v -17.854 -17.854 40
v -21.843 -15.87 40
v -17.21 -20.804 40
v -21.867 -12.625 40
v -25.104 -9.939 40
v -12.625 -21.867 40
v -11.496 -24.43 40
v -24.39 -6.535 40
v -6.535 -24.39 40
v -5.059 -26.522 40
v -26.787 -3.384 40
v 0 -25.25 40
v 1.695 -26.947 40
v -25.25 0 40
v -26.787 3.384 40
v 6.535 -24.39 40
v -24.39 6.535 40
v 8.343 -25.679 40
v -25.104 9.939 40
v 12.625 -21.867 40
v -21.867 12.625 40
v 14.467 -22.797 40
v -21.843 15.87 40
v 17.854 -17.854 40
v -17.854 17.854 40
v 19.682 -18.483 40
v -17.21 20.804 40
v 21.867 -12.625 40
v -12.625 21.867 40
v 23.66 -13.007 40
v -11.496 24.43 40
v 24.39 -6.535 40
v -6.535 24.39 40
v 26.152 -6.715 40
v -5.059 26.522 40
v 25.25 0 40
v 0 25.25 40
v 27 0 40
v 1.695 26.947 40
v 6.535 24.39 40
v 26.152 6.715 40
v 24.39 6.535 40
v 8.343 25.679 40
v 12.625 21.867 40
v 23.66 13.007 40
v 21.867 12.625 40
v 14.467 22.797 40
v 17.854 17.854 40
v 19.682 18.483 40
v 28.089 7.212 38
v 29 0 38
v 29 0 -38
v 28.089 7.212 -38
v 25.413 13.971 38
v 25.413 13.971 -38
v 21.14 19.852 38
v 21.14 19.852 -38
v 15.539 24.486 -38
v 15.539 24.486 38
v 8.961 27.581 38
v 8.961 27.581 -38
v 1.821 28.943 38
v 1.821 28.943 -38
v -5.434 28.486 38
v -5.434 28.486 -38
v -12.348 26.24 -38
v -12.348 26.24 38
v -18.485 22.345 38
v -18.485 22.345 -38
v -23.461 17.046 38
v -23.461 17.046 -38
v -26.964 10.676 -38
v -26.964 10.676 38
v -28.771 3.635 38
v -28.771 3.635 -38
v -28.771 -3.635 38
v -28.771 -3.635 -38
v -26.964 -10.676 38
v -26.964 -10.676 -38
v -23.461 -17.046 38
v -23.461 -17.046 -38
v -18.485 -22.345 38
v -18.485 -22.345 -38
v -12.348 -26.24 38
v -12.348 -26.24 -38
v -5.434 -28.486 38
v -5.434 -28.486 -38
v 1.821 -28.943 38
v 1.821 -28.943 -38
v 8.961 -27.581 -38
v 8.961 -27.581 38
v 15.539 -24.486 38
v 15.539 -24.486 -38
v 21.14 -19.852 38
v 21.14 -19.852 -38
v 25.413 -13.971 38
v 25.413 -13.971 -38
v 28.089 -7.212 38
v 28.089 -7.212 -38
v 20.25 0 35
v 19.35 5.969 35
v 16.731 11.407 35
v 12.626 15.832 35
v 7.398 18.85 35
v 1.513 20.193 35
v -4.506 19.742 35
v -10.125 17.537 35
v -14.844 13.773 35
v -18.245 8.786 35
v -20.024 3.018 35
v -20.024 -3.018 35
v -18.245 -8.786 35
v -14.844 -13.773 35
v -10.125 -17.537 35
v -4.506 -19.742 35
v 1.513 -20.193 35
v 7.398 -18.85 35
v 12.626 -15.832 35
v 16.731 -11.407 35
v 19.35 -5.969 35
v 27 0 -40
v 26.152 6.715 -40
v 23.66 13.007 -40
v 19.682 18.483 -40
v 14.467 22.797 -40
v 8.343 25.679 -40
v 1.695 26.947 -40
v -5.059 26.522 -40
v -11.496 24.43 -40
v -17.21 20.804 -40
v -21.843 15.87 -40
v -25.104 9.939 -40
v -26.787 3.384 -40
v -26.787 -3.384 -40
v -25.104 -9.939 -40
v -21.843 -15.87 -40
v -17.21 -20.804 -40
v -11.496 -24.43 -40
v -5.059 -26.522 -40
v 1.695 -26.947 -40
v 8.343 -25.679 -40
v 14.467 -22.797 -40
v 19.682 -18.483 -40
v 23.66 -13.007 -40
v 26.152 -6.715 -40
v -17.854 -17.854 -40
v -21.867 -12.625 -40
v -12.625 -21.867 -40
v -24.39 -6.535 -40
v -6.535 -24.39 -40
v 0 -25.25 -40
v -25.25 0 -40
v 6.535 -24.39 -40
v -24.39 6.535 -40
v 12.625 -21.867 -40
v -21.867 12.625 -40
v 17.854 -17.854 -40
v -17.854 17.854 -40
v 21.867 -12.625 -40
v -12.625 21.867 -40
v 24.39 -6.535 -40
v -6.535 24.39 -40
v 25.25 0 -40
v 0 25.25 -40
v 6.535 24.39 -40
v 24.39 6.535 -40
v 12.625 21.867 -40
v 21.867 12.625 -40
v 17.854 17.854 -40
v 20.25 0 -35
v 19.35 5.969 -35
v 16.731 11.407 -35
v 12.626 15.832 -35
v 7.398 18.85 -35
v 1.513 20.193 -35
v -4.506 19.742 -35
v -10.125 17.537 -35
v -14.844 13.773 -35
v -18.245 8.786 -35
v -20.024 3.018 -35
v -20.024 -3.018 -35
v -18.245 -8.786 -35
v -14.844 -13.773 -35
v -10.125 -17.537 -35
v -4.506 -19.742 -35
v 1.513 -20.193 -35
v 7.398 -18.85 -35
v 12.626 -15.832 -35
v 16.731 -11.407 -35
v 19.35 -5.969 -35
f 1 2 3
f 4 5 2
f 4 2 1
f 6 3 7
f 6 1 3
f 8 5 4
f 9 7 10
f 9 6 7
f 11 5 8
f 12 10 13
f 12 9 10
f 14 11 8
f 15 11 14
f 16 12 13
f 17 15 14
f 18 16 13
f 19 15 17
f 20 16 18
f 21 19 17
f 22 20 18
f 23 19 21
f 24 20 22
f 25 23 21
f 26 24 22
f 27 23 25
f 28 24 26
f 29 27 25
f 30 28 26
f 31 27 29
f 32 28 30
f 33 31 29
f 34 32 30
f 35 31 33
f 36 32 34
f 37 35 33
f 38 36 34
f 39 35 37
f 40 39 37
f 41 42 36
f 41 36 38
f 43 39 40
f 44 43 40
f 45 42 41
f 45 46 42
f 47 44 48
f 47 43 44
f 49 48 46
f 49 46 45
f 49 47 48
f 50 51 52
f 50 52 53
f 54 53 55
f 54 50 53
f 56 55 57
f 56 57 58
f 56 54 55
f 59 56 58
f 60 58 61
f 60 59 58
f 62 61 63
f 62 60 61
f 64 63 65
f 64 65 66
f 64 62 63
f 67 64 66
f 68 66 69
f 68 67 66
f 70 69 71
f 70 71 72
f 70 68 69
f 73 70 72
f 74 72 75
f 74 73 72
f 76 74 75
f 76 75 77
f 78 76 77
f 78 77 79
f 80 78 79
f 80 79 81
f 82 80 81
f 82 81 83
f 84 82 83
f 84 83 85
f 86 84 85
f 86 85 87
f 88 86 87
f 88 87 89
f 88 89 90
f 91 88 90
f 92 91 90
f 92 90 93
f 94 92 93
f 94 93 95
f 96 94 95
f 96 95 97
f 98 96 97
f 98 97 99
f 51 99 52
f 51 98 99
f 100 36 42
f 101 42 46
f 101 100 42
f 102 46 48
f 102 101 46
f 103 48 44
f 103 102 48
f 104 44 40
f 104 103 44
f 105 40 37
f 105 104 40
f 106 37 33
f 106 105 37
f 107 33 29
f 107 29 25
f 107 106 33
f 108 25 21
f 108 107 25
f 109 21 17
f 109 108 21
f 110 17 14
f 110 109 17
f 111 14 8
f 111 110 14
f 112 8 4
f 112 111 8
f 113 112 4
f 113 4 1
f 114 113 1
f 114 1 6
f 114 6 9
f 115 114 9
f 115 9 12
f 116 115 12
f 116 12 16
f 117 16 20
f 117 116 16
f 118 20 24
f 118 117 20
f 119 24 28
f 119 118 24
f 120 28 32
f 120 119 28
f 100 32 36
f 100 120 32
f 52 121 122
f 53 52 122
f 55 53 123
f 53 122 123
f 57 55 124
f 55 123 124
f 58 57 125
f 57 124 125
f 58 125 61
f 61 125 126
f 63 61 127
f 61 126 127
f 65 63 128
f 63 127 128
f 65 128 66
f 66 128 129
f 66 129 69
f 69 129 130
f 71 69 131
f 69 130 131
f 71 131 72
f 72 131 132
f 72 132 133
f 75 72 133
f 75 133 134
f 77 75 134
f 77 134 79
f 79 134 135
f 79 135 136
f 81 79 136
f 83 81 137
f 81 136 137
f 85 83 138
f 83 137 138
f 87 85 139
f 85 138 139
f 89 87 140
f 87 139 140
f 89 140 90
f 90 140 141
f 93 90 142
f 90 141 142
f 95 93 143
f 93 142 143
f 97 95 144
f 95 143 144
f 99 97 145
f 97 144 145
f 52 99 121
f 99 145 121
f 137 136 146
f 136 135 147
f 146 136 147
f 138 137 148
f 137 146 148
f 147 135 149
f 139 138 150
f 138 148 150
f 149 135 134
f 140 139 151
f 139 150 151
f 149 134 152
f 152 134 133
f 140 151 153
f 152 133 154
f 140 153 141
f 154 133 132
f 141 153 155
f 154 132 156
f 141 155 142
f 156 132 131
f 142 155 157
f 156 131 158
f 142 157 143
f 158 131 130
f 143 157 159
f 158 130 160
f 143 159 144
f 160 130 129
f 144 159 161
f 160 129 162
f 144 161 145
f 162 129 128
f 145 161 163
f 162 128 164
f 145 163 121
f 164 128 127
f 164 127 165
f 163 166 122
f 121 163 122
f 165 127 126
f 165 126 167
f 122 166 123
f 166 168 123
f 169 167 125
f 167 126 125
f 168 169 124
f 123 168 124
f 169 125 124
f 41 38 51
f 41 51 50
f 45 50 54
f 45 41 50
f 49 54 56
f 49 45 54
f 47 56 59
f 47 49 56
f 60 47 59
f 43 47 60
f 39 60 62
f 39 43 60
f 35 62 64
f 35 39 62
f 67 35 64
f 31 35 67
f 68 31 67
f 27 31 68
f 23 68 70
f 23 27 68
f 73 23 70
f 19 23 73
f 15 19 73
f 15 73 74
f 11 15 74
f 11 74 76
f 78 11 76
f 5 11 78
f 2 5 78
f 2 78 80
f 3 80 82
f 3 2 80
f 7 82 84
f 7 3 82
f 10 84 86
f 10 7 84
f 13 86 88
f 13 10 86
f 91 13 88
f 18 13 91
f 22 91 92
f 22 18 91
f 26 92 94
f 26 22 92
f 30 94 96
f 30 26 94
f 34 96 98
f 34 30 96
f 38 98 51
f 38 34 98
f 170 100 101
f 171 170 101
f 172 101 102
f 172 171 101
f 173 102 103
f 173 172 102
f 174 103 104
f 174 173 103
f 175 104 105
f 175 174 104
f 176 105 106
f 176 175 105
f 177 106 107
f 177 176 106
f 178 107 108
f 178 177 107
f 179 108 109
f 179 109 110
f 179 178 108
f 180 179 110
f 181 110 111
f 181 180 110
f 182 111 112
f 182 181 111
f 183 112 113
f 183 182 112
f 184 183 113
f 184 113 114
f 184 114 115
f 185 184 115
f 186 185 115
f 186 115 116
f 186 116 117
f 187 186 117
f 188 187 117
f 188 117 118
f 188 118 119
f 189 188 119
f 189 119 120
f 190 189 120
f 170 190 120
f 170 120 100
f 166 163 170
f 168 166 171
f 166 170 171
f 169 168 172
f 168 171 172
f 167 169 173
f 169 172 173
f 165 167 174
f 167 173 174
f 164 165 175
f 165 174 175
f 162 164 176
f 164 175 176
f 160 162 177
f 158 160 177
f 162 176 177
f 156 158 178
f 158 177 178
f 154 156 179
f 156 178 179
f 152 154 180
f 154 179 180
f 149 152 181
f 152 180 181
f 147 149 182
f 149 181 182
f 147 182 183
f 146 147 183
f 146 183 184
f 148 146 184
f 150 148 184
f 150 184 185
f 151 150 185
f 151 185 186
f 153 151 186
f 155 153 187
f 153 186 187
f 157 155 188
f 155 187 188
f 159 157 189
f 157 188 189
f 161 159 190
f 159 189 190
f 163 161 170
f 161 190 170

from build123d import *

# Parameters (mm, degrees)
F0_R     = 29
F0_R_2   = 20.25
F1_DEPTH = 40
F2_SIZE  = 5
F3_SIZE  = 2
F4_SIZE  = 2
F5_SIZE  = 5


with BuildPart() as f1:
    # F0 (on Top) → F1 (new body, symmetric)
    with BuildSketch(Plane.XY):
        Circle(F0_R)
        Circle(F0_R_2, mode=Mode.SUBTRACT)
    extrude(amount=F1_DEPTH, both=True)

    # F2
    f2_edges = [f1.edges().sort_by_distance(p)[0] for p in [
        (-20.25, 0, 40),
    ]]
    chamfer(f2_edges, length=F2_SIZE)

    # F3
    f3_edges = [f1.edges().sort_by_distance(p)[0] for p in [
        (-29, 0, -40),
    ]]
    chamfer(f3_edges, length=F3_SIZE)

    # F4
    f4_edges = [f1.edges().sort_by_distance(p)[0] for p in [
        (-29, 0, 40),
    ]]
    chamfer(f4_edges, length=F4_SIZE)

    # F5
    f5_edges = [f1.edges().sort_by_distance(p)[0] for p in [
        (-20.25, 0, -40),
    ]]
    chamfer(f5_edges, length=F5_SIZE)


solid = f1.part
